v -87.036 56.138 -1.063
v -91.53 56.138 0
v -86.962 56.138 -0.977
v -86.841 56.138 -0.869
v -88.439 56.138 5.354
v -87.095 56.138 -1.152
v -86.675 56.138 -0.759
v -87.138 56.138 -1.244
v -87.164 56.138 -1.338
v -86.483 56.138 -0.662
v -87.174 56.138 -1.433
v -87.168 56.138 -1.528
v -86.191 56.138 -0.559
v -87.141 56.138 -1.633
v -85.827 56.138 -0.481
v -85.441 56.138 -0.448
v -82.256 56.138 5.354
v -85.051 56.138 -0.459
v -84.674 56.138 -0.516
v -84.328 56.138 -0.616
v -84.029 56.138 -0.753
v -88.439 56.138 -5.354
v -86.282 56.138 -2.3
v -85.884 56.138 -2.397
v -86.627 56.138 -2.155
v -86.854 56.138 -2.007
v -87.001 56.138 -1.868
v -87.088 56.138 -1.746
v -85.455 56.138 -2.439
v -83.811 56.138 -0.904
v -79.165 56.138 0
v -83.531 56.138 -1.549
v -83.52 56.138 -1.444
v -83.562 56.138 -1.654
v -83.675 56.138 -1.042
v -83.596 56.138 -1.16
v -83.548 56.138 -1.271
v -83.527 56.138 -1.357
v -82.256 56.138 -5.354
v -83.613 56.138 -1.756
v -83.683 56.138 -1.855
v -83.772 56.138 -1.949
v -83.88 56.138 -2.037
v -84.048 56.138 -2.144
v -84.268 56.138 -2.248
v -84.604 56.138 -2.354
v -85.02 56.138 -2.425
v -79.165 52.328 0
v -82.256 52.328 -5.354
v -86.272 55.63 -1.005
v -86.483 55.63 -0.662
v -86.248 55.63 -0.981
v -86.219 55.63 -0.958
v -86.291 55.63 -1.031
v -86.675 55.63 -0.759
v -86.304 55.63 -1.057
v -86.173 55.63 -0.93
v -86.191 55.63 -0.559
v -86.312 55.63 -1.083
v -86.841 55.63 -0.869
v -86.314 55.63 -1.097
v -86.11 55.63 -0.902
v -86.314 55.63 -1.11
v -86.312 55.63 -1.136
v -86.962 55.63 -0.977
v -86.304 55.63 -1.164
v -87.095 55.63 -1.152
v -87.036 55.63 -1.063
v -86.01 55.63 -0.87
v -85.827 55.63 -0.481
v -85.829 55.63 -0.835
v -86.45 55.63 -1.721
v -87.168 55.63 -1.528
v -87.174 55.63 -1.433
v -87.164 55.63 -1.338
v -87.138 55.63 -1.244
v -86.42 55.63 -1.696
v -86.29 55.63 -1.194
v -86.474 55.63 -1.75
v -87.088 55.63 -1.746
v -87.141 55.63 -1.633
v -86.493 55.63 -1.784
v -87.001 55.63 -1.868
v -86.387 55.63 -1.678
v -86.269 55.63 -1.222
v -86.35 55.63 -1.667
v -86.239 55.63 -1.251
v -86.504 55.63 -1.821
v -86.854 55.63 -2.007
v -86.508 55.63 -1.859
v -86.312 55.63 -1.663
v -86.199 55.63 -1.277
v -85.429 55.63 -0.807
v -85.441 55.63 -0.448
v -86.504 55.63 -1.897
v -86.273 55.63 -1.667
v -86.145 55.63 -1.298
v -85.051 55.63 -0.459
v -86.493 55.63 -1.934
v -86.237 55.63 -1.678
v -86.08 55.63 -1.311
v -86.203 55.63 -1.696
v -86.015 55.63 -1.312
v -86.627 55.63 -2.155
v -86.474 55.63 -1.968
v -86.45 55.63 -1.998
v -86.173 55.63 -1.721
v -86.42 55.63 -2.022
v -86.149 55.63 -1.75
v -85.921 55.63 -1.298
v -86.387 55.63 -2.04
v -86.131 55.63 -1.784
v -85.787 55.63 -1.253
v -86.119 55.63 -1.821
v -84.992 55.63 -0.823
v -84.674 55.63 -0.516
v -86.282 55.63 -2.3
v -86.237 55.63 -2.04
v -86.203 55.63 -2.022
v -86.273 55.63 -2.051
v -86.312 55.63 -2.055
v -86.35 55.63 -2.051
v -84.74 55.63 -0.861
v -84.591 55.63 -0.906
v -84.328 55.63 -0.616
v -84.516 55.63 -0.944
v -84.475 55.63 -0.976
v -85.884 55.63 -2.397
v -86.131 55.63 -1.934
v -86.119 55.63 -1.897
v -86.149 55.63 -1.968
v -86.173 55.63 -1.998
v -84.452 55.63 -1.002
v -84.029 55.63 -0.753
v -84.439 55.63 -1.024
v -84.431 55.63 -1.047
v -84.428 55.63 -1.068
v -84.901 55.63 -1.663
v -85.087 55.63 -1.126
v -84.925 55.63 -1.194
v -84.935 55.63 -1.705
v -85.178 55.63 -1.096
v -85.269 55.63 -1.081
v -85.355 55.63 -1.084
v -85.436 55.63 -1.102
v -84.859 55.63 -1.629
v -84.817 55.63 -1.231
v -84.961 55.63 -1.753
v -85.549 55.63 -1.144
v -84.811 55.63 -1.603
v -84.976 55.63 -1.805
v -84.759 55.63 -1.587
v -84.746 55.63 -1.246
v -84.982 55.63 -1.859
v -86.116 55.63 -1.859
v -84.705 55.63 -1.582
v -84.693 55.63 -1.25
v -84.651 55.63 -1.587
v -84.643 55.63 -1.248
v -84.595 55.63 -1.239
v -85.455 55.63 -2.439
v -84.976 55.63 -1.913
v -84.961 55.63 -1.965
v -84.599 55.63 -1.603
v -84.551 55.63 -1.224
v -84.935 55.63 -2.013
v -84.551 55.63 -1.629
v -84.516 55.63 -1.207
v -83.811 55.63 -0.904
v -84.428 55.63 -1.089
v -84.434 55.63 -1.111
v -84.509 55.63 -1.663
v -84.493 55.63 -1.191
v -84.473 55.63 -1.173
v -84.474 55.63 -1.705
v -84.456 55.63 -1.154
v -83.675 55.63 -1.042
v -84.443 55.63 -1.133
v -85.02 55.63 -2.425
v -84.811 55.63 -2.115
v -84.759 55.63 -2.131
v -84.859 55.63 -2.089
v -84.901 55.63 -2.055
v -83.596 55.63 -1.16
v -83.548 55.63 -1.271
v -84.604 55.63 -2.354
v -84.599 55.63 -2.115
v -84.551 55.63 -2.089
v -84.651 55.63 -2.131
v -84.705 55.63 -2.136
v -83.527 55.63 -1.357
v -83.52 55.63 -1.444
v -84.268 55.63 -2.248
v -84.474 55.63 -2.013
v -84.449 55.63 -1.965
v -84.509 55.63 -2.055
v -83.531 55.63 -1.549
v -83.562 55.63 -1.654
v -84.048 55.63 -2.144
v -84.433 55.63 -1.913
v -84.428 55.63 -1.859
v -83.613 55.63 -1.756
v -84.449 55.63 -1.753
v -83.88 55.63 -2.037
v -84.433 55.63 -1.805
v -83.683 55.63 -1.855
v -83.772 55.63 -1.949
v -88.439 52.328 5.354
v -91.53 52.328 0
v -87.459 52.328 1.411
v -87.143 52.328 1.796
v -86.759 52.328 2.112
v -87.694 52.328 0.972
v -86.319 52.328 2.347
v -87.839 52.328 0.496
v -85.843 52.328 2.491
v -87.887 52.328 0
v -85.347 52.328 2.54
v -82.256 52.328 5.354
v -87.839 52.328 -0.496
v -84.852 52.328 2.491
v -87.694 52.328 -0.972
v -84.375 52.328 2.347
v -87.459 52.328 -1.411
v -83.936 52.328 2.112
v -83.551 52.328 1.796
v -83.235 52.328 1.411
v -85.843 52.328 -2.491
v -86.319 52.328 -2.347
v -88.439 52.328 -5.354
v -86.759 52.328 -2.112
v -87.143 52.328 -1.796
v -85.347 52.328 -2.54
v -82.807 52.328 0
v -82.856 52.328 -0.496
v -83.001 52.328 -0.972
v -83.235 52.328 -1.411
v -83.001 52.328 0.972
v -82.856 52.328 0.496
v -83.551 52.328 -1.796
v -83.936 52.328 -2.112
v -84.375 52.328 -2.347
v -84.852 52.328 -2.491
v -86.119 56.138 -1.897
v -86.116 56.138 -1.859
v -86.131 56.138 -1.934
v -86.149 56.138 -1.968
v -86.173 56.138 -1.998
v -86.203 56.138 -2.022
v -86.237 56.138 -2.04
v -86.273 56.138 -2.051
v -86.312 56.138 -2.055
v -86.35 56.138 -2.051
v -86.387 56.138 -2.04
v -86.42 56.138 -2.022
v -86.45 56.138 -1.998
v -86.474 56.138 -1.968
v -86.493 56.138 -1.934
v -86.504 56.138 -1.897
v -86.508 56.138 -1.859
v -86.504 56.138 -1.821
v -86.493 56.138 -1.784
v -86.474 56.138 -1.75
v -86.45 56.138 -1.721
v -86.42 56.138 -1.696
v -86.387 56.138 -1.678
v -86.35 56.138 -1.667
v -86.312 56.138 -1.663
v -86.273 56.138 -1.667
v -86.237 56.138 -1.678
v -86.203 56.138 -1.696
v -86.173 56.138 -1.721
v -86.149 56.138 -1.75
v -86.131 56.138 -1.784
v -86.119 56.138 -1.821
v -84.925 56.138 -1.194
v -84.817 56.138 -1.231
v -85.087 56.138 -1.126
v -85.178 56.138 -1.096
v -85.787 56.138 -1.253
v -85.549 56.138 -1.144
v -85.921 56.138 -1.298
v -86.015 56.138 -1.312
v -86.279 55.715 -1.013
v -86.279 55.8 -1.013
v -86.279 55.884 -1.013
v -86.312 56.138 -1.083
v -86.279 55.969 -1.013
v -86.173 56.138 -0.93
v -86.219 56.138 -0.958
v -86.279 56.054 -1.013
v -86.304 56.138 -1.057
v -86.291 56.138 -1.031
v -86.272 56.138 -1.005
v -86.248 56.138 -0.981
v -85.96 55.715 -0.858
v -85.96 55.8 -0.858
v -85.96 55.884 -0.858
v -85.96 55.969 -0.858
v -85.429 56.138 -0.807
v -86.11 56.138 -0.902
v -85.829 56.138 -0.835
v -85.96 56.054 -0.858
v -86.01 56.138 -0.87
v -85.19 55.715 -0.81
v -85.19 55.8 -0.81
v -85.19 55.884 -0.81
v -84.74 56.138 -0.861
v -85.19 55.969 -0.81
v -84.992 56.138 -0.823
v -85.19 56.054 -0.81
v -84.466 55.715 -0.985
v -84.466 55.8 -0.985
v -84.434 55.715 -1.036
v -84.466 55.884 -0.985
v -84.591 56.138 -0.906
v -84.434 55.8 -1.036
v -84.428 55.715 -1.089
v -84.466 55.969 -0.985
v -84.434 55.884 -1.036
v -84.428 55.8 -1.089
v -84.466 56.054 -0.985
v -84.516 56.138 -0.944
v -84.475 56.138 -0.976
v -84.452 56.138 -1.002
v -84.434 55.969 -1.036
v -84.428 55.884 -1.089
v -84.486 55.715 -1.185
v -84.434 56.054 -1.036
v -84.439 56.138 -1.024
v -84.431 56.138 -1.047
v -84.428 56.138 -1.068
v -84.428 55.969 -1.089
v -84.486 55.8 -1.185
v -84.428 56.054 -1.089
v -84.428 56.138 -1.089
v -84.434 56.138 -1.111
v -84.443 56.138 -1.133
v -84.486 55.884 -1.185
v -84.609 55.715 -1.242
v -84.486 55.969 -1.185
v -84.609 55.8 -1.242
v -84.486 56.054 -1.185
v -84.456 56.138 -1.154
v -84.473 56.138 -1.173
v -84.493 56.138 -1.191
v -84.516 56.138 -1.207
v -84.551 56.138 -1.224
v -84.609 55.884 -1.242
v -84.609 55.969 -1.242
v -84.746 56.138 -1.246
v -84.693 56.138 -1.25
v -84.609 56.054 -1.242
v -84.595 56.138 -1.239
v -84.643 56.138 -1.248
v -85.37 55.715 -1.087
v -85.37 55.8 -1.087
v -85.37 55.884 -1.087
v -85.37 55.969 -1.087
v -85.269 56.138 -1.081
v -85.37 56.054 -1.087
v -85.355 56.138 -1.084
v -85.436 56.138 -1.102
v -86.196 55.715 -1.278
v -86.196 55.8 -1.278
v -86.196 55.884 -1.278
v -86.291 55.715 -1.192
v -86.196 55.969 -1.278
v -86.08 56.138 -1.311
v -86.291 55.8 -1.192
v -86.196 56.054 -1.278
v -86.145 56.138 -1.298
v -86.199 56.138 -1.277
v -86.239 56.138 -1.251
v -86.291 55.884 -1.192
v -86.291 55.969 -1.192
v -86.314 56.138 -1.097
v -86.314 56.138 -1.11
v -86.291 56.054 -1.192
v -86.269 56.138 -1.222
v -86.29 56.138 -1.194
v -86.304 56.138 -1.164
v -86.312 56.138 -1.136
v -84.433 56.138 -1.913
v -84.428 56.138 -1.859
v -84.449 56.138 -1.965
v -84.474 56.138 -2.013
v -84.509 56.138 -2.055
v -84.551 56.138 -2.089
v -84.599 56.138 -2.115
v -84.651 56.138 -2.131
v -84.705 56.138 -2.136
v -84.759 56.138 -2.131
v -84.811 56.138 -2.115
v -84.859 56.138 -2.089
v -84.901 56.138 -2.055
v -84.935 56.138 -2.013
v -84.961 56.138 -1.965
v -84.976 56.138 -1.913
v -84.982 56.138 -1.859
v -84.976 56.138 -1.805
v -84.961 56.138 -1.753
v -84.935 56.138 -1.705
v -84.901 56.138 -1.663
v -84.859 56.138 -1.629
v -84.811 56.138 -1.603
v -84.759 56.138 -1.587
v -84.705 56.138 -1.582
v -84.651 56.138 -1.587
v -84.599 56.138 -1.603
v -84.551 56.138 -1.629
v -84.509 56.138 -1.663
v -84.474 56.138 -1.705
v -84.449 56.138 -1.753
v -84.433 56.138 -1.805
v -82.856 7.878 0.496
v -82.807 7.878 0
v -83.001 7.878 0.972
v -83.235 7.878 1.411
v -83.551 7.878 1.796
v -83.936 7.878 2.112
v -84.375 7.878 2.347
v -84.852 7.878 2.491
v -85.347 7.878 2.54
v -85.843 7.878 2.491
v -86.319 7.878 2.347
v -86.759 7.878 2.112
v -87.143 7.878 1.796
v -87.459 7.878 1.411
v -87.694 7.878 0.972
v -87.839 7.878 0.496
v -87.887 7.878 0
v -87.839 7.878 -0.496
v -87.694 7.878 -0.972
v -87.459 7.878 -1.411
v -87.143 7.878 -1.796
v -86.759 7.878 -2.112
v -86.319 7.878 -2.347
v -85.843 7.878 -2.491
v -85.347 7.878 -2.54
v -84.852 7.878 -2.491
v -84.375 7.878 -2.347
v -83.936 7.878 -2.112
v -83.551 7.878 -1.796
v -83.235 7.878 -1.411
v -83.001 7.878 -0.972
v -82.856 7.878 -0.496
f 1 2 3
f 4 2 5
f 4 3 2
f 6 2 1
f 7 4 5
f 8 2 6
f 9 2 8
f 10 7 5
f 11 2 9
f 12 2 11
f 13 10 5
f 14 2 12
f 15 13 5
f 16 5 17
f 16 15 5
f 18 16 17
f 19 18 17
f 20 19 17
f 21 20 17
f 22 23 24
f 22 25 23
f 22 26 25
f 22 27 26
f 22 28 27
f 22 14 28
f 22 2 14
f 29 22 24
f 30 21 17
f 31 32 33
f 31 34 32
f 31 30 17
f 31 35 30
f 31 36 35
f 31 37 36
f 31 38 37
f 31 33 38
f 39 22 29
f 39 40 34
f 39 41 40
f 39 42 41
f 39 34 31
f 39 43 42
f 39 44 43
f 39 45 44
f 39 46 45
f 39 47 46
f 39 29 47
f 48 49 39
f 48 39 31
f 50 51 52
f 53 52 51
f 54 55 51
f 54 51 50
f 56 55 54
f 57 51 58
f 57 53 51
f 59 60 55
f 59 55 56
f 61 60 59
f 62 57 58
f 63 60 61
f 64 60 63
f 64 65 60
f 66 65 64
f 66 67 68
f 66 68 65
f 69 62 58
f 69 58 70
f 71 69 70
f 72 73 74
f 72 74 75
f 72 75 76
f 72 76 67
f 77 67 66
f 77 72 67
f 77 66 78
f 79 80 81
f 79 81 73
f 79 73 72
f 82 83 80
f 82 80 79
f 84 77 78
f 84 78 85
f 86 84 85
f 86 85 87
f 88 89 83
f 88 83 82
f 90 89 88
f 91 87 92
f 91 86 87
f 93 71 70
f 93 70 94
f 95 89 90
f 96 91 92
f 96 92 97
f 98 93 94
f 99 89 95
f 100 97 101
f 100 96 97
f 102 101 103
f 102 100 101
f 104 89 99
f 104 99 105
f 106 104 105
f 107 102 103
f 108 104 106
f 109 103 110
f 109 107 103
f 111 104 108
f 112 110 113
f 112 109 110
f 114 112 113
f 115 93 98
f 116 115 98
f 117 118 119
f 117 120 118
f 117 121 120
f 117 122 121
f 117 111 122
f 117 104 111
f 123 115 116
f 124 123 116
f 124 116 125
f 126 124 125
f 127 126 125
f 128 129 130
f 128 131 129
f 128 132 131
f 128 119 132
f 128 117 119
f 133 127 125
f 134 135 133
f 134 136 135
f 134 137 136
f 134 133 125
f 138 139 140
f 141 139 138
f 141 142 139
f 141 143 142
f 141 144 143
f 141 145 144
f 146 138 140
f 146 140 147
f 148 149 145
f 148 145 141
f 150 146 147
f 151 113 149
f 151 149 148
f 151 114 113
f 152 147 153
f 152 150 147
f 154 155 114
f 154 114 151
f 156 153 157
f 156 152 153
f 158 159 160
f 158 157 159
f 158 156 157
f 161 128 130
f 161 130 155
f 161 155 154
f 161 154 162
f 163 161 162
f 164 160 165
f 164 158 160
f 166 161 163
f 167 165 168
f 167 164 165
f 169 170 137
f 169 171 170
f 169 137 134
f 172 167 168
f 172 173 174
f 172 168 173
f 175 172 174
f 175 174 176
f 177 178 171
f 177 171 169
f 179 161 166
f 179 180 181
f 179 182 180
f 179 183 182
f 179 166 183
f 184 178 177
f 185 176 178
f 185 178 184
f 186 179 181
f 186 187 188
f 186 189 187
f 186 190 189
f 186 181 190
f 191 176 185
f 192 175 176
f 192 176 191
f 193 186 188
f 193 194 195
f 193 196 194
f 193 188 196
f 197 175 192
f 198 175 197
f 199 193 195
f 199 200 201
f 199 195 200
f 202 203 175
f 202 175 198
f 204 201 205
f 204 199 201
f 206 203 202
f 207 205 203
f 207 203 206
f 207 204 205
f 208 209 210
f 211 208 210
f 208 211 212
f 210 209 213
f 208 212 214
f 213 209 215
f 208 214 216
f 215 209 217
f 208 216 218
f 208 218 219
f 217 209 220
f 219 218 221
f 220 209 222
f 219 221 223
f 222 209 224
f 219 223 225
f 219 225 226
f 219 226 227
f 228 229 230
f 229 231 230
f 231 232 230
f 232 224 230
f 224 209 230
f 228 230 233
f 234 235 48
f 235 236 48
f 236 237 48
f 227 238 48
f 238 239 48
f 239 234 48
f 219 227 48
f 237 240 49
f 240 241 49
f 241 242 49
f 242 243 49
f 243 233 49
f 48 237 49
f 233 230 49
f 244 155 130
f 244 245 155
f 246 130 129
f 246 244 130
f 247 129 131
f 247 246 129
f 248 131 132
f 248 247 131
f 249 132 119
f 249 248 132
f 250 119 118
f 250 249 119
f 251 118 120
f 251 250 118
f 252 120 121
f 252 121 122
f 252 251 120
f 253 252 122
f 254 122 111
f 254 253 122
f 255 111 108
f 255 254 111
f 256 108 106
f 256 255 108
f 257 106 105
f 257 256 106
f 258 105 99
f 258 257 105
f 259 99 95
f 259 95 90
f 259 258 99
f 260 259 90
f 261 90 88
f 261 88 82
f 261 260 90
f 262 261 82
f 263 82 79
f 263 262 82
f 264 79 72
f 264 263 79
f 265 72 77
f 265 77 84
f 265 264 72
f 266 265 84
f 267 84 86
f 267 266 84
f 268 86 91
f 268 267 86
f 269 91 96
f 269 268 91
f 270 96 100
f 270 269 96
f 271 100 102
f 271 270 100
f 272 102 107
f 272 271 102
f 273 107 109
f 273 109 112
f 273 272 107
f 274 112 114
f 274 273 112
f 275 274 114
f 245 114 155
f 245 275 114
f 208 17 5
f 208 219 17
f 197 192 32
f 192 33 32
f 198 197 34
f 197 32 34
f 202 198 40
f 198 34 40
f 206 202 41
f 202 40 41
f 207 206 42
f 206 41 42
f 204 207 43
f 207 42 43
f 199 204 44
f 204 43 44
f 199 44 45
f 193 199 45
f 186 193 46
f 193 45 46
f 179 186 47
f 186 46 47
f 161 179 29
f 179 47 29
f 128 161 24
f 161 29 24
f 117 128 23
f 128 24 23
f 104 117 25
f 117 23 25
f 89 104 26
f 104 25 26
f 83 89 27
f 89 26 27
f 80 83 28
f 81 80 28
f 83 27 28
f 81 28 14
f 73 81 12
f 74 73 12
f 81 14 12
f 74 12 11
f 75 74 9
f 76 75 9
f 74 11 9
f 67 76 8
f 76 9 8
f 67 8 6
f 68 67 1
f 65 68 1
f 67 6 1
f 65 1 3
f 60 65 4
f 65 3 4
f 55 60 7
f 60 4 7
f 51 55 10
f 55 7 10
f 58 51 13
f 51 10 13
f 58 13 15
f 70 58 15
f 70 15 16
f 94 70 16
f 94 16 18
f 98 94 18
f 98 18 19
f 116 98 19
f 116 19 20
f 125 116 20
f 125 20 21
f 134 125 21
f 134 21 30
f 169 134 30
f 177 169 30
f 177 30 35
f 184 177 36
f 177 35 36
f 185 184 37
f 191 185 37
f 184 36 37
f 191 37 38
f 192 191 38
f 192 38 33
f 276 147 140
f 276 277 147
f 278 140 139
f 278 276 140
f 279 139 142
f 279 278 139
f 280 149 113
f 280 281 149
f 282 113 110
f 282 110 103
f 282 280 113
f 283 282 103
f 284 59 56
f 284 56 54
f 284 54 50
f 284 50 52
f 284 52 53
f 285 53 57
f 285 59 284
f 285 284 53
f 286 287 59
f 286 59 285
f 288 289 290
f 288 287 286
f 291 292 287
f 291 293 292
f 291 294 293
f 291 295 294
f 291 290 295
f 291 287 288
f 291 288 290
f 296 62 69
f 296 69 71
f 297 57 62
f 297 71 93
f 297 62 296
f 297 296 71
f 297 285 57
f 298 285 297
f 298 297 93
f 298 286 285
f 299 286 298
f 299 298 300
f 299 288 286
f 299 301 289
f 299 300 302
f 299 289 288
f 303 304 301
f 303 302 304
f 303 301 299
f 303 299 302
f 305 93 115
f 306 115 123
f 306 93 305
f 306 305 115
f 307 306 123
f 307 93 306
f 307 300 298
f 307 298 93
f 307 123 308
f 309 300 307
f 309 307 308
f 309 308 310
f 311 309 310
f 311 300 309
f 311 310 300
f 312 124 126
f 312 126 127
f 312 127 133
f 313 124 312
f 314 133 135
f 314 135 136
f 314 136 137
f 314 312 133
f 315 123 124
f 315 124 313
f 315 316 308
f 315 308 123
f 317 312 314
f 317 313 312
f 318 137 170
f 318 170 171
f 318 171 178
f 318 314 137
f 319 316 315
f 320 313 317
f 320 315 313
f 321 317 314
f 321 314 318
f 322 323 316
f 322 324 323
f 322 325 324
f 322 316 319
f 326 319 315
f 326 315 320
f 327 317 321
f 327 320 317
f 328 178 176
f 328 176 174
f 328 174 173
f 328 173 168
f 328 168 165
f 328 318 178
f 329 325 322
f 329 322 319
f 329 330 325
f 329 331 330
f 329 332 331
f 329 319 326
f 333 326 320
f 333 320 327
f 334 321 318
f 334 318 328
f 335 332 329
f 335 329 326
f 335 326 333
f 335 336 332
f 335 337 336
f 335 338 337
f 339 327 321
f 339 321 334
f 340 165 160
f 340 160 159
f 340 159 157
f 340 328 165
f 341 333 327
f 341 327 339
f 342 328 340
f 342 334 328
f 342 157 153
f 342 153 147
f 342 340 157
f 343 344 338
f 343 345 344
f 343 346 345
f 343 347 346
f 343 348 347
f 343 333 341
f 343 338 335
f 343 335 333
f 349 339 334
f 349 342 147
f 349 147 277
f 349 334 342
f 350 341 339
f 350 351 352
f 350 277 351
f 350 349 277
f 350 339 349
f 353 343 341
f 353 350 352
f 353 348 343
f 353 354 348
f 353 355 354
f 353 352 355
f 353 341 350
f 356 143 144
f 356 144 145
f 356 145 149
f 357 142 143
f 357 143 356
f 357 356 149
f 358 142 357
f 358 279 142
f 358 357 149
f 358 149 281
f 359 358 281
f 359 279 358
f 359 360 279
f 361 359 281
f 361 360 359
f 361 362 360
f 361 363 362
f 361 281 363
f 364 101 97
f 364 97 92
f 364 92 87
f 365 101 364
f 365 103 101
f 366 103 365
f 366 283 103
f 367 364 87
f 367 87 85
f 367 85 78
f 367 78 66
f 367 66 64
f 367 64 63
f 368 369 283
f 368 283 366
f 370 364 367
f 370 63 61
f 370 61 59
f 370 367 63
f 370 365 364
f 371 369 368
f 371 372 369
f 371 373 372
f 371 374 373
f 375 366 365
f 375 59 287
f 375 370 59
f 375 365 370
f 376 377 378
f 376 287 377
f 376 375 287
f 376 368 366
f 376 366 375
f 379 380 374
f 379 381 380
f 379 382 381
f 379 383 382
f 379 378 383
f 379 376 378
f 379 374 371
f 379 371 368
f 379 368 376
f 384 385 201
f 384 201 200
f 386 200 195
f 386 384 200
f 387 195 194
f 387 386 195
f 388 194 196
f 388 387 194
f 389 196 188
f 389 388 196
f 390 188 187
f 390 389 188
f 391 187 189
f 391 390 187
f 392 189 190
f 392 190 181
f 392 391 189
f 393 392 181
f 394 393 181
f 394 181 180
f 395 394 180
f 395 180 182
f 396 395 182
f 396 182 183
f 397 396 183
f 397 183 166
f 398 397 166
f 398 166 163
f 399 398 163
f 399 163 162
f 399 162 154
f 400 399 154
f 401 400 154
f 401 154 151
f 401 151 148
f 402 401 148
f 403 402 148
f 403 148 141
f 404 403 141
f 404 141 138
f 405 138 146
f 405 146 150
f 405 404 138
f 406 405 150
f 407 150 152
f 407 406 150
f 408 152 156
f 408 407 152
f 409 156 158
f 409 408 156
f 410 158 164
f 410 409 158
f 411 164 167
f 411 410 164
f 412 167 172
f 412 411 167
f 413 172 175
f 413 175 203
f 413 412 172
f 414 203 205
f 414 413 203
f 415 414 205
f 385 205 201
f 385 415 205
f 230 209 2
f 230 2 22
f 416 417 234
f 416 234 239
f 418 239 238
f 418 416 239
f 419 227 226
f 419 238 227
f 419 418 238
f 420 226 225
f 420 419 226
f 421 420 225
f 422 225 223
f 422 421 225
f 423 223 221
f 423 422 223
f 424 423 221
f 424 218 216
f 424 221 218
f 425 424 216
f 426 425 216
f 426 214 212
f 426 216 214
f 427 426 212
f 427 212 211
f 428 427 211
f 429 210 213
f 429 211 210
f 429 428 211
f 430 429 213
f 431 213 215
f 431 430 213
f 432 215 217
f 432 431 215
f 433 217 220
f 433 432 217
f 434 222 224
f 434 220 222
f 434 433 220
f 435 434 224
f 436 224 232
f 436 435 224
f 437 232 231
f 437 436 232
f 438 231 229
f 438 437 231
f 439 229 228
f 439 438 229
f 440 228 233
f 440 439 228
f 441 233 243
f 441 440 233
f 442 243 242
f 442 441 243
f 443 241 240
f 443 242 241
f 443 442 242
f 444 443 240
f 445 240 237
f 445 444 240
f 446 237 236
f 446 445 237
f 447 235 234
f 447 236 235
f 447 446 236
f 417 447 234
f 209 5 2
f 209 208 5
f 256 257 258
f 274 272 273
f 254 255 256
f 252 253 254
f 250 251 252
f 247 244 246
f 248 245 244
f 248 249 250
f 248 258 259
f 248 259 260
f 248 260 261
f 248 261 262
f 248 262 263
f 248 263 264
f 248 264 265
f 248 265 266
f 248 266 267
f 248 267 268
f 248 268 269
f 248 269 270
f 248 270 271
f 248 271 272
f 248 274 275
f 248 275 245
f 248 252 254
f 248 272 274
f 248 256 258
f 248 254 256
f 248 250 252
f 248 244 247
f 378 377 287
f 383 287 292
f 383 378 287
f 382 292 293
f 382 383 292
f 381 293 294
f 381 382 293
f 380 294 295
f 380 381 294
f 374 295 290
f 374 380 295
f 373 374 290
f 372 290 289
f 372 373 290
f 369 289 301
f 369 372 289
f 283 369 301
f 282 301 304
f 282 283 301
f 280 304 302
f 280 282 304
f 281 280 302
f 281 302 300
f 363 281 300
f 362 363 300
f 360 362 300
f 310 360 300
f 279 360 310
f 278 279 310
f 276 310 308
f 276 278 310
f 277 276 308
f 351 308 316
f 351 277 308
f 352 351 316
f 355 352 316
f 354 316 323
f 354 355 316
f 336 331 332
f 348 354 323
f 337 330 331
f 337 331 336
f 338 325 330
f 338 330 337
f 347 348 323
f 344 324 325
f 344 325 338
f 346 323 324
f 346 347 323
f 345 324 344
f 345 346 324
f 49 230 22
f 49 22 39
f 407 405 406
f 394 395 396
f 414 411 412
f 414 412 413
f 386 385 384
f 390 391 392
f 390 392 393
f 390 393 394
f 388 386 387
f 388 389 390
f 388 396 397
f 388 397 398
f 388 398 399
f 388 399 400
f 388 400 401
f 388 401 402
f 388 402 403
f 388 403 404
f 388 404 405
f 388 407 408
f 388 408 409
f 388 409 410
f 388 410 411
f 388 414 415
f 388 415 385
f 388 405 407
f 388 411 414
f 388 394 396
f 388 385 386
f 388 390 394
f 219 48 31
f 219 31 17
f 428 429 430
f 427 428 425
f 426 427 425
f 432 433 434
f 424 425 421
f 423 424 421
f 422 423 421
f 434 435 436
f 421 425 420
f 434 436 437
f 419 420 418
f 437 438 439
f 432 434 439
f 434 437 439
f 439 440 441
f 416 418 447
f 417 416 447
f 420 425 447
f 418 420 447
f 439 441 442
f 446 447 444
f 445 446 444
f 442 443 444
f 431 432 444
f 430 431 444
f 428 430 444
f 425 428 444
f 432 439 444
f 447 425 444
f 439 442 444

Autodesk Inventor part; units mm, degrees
ref_plane "YZ Plane" through (0, 0, 0) normal (1, 0, 0) x (0, 1, 0)
ref_plane "XZ Plane" through (0, 0, 0) normal (0, 1, 0) x (-1, 0, 0)
ref_plane "XY Plane" through (0, 0, 0) normal (0, 0, 1) x (1, 0, 0)
sketch "Sketch1" plane through (0, 0, 0) normal (0, 0, 1) x (1, 0, 0)
  line L0 (-85.3474, 52.3284) -> (-82.8074, 52.3284)
  line L1 (-82.8074, 52.3284) -> (-82.8074, 7.8784)
  line L2 (-82.8074, 7.8784) -> (-85.3474, 7.8784)
  line L3 (-85.3474, 7.8784) -> (-85.3474, 52.3284)
  point P0 (0, 0)
  dimension "d0" = 2.54
  dimension "d1" = 44.45
revolve "Revolution1" add sketch "Sketch1" angle 360 about axis through (-85.3474, 7.8784, 0) along (0, 1, 0)
sketch "Sketch2" plane through (-85.3474, 52.3284, 0) normal (0, 1, 0) x (1, 0, 0)
  circle A0 centre (0, 0) radius 2.54 projected
  line L0 (6.1828, 0) -> (3.0914, -5.3544)
  line L1 (3.0914, -5.3544) -> (-3.0914, -5.3544)
  line L2 (-3.0914, -5.3544) -> (-6.1828, 0)
  line L3 (-6.1828, 0) -> (-3.0914, 5.3544)
  line L4 (-3.0914, 5.3544) -> (3.0914, 5.3544)
  line L5 (3.0914, 5.3544) -> (6.1828, 0)
  point P0 (85.3474, 0)
extrude "Extrusion1" add sketch "Sketch2" along normal blind 3.81 contours A0 | L0 L1 L2 L3 L4 L5
sketch "Sketch3" plane through (-85.3474, 56.1384, 0) normal (0, 1, 0) x (1, 0, 0)
  line L0 (-3.0914, 5.3544) -> (3.0914, 5.3544) projected
  ellipse E0 centre (0, 1.4435) end of major axis (0, 0.4462) minor radius 1.8269
  spline S0 degree 5 poles (-0.9642, 1.0834) (-0.9417, 0.9678) (-0.7135, 0.7937) (0.1443, 0.7781) (1.4903, 0.7931) (0.5526, 1.6401) (0.1051, 0.6276) (-0.4914, 1.4752) (-0.8935, 1.3263) (-0.9814, 1.1718) (-0.9642, 1.0834) knots 0 0 0 0 0 0 0.230424 0.370543 0.547944 0.706233 0.823711 1 1 1 1 1 1
  circle A0 centre (-0.9642, 1.8591) radius 0.1959
  circle A1 centre (0.6426, 1.8591) radius 0.277
  point P0 (85.3474, 0)
  point P1 (0.9196, 1.0834)
  point P2 (0.6426, 1.2496)
  point P3 (0, 1.0834)
  point P4 (-0.7703, 1.305)
extrude "Extrusion2" cut sketch "Sketch3" against normal blind 0.508
properties part number ".2'' diameter 2.5 inch bolts for wheel"
